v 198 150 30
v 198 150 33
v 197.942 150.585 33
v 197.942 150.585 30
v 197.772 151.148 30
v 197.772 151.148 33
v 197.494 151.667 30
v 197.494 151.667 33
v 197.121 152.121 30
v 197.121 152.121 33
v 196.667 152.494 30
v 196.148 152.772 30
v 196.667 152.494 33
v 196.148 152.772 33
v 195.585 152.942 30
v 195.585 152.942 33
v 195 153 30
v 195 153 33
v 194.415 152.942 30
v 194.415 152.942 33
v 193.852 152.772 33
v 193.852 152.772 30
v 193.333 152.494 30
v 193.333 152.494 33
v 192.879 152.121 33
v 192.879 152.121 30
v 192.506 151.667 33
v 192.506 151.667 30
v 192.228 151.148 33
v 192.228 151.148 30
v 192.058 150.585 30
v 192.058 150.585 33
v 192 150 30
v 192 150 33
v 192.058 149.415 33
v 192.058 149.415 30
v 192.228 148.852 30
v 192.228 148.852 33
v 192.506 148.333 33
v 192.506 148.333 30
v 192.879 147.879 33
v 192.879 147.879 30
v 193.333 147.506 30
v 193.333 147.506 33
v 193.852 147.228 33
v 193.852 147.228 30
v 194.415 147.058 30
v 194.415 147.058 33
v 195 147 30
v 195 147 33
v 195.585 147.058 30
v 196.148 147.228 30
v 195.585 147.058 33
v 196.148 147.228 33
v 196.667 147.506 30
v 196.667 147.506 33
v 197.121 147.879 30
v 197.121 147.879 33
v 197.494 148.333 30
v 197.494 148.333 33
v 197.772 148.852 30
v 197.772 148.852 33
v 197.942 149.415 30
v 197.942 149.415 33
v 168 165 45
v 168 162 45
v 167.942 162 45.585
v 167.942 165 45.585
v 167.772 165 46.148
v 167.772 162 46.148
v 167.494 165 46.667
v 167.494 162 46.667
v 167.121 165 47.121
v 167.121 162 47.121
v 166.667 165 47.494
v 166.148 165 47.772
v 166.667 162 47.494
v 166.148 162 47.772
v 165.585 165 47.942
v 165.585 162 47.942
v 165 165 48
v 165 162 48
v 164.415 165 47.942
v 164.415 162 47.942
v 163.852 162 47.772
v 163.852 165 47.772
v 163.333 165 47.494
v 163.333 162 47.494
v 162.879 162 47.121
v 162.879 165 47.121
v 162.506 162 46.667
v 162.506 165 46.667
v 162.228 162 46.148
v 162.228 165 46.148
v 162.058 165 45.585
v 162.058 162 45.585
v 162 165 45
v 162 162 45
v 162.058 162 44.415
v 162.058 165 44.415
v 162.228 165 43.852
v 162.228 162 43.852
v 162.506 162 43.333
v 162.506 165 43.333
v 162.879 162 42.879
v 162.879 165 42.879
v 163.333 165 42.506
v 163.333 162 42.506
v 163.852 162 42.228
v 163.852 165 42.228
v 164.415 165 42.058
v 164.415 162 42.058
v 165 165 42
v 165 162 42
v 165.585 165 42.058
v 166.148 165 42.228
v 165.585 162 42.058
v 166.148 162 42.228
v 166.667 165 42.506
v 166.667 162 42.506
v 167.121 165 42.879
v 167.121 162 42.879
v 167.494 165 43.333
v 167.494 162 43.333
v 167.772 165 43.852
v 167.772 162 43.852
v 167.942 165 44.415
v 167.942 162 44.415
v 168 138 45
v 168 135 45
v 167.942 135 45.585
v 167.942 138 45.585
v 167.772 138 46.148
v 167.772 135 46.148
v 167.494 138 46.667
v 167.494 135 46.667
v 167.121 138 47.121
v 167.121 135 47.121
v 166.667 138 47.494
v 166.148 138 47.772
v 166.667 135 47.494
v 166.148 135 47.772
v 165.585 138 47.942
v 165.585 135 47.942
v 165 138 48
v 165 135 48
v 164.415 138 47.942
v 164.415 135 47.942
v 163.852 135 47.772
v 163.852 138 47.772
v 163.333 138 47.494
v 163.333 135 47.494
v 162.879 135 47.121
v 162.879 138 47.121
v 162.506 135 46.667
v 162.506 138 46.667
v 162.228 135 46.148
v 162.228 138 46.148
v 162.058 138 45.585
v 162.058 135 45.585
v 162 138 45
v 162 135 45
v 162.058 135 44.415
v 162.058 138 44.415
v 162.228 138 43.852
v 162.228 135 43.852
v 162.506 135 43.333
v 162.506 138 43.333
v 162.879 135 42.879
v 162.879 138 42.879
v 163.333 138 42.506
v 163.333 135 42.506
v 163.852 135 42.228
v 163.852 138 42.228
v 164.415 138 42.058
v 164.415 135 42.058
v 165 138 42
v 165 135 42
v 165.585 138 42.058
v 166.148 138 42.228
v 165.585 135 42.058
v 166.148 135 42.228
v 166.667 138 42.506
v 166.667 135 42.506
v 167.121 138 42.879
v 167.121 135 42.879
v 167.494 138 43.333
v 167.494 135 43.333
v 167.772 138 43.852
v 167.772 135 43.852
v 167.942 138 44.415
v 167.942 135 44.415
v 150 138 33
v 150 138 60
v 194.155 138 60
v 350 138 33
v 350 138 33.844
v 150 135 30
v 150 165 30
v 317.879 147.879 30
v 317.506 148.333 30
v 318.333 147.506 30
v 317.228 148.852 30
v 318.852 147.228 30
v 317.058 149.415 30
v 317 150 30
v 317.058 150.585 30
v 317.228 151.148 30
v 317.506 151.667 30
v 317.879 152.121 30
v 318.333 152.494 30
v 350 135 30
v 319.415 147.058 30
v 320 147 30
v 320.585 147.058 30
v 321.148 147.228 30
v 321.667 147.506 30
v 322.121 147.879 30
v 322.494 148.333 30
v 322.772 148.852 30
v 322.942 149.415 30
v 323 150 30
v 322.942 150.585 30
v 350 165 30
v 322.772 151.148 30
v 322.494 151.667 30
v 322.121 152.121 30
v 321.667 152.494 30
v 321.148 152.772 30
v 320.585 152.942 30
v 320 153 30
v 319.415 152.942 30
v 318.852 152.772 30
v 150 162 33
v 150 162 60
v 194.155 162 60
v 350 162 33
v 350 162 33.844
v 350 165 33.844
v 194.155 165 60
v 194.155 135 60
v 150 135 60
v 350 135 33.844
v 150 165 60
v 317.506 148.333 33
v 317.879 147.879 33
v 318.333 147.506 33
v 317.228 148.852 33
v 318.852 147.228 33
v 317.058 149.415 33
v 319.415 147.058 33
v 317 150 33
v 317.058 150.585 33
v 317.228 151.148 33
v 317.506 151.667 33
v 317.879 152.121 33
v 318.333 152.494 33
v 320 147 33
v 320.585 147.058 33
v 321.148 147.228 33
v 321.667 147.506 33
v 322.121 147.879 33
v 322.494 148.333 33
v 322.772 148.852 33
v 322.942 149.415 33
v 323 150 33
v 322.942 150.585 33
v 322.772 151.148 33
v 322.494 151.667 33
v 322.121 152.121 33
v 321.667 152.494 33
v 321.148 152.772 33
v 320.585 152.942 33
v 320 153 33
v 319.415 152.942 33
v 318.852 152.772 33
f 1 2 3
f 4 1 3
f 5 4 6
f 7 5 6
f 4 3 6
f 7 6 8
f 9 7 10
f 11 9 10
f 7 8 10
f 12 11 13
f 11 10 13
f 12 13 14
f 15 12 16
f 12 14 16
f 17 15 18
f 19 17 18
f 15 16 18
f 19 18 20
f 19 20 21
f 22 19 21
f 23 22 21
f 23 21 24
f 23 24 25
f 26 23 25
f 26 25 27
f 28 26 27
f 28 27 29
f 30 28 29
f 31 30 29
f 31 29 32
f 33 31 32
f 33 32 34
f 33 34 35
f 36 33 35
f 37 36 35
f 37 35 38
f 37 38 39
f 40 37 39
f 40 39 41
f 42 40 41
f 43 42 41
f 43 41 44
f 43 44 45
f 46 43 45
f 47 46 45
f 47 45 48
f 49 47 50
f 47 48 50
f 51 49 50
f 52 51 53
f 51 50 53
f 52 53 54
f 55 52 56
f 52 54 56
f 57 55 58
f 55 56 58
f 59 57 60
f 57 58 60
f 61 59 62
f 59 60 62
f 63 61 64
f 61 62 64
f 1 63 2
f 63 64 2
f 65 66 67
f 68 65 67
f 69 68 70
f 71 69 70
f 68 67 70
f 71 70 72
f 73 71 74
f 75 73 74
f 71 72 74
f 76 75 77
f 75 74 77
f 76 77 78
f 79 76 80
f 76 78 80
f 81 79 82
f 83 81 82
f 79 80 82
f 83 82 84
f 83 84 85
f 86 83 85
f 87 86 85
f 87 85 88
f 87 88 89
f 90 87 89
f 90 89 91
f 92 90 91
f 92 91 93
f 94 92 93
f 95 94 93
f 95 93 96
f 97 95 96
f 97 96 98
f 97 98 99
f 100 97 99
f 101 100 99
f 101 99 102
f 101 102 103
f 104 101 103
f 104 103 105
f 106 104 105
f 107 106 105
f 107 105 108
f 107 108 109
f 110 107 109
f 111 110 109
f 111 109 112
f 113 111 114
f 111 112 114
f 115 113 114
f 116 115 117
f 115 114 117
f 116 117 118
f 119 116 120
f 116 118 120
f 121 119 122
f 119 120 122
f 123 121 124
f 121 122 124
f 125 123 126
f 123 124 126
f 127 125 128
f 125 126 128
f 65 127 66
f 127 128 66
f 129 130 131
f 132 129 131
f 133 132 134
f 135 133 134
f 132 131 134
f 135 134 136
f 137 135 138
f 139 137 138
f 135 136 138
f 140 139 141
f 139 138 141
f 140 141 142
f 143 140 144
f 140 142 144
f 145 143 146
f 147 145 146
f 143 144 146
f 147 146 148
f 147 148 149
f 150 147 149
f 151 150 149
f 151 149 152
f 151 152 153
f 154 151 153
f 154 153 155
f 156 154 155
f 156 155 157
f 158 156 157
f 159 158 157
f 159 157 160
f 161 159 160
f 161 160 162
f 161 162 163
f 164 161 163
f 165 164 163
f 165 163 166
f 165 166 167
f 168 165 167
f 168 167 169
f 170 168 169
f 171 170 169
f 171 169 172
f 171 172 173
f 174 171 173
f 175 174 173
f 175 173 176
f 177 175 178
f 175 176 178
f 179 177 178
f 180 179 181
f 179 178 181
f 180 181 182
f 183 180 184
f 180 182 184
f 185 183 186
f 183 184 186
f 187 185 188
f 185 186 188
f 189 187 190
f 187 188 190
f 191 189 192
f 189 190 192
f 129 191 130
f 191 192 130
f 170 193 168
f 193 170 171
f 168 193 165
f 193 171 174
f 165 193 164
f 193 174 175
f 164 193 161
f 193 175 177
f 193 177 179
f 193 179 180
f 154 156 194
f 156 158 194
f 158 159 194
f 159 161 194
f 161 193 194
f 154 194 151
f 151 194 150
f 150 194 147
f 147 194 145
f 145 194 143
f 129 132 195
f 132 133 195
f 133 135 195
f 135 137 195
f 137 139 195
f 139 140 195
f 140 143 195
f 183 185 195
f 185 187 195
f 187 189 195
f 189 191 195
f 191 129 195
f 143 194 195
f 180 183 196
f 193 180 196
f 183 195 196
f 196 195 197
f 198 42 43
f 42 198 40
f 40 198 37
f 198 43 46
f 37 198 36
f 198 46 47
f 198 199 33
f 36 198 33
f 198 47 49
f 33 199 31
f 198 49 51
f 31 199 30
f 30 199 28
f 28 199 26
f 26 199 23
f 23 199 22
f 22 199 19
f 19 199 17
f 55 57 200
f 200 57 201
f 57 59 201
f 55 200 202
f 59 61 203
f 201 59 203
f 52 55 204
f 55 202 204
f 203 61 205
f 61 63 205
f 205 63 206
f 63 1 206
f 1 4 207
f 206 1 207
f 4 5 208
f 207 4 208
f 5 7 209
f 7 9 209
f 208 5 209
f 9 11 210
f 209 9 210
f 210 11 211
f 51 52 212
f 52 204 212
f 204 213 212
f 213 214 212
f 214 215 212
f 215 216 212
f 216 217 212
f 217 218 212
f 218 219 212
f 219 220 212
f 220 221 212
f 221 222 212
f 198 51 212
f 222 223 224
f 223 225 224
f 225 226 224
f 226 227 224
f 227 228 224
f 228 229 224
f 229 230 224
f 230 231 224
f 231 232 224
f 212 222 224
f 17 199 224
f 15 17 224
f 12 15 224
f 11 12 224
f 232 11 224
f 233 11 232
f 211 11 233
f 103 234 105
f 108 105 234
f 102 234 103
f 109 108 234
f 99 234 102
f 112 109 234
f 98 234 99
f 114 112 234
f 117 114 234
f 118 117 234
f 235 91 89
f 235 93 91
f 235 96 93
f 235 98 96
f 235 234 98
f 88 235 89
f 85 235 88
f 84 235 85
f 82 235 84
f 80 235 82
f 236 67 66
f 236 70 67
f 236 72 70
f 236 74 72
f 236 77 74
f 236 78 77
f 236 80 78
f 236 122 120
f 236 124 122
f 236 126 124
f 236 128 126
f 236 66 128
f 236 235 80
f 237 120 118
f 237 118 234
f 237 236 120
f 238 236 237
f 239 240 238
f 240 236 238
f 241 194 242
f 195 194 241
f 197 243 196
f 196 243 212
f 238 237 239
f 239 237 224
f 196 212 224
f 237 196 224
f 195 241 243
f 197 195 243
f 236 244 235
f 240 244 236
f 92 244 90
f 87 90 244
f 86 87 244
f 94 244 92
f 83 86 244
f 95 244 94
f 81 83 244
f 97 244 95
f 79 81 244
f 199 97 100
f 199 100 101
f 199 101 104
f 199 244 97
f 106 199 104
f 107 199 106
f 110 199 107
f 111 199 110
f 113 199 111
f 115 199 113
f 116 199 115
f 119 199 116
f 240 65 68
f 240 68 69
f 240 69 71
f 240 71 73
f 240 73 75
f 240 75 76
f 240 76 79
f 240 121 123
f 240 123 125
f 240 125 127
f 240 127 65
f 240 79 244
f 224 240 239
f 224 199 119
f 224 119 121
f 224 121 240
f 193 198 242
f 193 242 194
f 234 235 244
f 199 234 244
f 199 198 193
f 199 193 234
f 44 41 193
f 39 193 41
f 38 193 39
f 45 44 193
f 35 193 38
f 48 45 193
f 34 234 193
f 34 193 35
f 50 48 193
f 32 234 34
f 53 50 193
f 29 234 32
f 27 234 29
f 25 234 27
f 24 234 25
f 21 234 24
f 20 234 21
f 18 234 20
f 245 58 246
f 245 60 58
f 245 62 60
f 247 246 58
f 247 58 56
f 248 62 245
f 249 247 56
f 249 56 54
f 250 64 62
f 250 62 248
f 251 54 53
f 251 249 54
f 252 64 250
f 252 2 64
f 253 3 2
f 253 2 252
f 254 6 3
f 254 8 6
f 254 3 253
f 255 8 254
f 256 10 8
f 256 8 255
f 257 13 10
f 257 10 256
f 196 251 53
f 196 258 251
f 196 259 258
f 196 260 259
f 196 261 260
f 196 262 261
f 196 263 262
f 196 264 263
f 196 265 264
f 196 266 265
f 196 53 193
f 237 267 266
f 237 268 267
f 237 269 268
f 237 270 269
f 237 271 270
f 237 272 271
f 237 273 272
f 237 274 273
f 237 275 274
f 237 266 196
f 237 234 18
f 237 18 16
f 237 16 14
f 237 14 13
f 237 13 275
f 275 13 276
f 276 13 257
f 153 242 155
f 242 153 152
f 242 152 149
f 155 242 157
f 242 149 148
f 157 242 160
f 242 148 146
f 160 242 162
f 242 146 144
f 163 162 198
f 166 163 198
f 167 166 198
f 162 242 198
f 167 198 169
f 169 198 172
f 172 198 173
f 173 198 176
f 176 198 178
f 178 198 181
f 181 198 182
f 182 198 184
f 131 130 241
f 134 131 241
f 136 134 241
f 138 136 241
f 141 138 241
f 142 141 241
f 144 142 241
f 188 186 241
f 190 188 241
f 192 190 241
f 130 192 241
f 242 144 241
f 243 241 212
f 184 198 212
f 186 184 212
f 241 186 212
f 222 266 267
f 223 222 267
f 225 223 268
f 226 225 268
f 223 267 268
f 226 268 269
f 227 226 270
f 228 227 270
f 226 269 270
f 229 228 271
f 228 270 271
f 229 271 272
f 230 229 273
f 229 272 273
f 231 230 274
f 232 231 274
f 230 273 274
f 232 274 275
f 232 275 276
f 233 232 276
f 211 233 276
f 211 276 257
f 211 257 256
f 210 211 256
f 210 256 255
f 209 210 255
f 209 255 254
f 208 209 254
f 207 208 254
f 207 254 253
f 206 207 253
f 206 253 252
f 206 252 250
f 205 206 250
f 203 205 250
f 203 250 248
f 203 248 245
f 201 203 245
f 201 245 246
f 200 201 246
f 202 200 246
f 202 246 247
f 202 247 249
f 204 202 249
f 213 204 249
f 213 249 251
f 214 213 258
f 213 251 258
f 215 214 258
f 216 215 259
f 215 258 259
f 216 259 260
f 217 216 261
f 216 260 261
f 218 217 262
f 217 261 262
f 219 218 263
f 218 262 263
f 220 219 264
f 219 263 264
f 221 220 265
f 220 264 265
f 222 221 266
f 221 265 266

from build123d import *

# Parameters (mm, degrees)
BOX001_W        = 200
BOX001_H        = 30
BOX001_DEPTH    = 30
SKETCH003_W     = 207.751177
SKETCH003_H     = 24
POCKET005_DEPTH = 27
POCKET001_DEPTH = 50
SKETCH006_R     = 3
POCKET003_DEPTH = 50
SKETCH004_R     = 3
POCKET004_DEPTH = 5


with BuildPart() as part:
    # Box001 → Box001 (join)
    with BuildSketch(Plane.XY):
        with Locations((100, 15)):
            Rectangle(BOX001_W, BOX001_H)
    extrude(amount=BOX001_DEPTH)

    # Sketch003 (on Face6 of Box001) → Pocket005 (cut)
    with BuildSketch(Plane.XY.offset(30)):
        with Locations((99.970328, 15)):
            Rectangle(SKETCH003_W, SKETCH003_H)
    extrude(amount=-POCKET005_DEPTH, mode=Mode.SUBTRACT)

    # Sketch005 (on Face9 of Pocket005) → Pocket001 (cut)
    with BuildSketch(Plane.XZ):
        Polygon((20.202248, 34.020094), (202.686674, 3.393335), (216.979173, 34.020094), align=None)
    extrude(amount=-POCKET001_DEPTH, mode=Mode.SUBTRACT)

    # Sketch006 → Pocket003 (cut)
    with BuildSketch(Plane.XZ):
        with Locations((15, 15)):
            Circle(SKETCH006_R)
    extrude(amount=-POCKET003_DEPTH, mode=Mode.SUBTRACT)

    # Sketch004 (on Face4 of Pocket001) → Pocket004 (cut)
    with BuildSketch(Plane.XY.offset(3)):
        with Locations((45, 15)):
            Circle(SKETCH004_R)
        with Locations((170, 15)):
            Circle(SKETCH004_R)
    extrude(amount=-POCKET004_DEPTH, mode=Mode.SUBTRACT)


with BuildPart() as part_1:
    # Body003 placement: moved
    add(part.part.moved(Location((150, 135, 30))))


solid = part_1.part
